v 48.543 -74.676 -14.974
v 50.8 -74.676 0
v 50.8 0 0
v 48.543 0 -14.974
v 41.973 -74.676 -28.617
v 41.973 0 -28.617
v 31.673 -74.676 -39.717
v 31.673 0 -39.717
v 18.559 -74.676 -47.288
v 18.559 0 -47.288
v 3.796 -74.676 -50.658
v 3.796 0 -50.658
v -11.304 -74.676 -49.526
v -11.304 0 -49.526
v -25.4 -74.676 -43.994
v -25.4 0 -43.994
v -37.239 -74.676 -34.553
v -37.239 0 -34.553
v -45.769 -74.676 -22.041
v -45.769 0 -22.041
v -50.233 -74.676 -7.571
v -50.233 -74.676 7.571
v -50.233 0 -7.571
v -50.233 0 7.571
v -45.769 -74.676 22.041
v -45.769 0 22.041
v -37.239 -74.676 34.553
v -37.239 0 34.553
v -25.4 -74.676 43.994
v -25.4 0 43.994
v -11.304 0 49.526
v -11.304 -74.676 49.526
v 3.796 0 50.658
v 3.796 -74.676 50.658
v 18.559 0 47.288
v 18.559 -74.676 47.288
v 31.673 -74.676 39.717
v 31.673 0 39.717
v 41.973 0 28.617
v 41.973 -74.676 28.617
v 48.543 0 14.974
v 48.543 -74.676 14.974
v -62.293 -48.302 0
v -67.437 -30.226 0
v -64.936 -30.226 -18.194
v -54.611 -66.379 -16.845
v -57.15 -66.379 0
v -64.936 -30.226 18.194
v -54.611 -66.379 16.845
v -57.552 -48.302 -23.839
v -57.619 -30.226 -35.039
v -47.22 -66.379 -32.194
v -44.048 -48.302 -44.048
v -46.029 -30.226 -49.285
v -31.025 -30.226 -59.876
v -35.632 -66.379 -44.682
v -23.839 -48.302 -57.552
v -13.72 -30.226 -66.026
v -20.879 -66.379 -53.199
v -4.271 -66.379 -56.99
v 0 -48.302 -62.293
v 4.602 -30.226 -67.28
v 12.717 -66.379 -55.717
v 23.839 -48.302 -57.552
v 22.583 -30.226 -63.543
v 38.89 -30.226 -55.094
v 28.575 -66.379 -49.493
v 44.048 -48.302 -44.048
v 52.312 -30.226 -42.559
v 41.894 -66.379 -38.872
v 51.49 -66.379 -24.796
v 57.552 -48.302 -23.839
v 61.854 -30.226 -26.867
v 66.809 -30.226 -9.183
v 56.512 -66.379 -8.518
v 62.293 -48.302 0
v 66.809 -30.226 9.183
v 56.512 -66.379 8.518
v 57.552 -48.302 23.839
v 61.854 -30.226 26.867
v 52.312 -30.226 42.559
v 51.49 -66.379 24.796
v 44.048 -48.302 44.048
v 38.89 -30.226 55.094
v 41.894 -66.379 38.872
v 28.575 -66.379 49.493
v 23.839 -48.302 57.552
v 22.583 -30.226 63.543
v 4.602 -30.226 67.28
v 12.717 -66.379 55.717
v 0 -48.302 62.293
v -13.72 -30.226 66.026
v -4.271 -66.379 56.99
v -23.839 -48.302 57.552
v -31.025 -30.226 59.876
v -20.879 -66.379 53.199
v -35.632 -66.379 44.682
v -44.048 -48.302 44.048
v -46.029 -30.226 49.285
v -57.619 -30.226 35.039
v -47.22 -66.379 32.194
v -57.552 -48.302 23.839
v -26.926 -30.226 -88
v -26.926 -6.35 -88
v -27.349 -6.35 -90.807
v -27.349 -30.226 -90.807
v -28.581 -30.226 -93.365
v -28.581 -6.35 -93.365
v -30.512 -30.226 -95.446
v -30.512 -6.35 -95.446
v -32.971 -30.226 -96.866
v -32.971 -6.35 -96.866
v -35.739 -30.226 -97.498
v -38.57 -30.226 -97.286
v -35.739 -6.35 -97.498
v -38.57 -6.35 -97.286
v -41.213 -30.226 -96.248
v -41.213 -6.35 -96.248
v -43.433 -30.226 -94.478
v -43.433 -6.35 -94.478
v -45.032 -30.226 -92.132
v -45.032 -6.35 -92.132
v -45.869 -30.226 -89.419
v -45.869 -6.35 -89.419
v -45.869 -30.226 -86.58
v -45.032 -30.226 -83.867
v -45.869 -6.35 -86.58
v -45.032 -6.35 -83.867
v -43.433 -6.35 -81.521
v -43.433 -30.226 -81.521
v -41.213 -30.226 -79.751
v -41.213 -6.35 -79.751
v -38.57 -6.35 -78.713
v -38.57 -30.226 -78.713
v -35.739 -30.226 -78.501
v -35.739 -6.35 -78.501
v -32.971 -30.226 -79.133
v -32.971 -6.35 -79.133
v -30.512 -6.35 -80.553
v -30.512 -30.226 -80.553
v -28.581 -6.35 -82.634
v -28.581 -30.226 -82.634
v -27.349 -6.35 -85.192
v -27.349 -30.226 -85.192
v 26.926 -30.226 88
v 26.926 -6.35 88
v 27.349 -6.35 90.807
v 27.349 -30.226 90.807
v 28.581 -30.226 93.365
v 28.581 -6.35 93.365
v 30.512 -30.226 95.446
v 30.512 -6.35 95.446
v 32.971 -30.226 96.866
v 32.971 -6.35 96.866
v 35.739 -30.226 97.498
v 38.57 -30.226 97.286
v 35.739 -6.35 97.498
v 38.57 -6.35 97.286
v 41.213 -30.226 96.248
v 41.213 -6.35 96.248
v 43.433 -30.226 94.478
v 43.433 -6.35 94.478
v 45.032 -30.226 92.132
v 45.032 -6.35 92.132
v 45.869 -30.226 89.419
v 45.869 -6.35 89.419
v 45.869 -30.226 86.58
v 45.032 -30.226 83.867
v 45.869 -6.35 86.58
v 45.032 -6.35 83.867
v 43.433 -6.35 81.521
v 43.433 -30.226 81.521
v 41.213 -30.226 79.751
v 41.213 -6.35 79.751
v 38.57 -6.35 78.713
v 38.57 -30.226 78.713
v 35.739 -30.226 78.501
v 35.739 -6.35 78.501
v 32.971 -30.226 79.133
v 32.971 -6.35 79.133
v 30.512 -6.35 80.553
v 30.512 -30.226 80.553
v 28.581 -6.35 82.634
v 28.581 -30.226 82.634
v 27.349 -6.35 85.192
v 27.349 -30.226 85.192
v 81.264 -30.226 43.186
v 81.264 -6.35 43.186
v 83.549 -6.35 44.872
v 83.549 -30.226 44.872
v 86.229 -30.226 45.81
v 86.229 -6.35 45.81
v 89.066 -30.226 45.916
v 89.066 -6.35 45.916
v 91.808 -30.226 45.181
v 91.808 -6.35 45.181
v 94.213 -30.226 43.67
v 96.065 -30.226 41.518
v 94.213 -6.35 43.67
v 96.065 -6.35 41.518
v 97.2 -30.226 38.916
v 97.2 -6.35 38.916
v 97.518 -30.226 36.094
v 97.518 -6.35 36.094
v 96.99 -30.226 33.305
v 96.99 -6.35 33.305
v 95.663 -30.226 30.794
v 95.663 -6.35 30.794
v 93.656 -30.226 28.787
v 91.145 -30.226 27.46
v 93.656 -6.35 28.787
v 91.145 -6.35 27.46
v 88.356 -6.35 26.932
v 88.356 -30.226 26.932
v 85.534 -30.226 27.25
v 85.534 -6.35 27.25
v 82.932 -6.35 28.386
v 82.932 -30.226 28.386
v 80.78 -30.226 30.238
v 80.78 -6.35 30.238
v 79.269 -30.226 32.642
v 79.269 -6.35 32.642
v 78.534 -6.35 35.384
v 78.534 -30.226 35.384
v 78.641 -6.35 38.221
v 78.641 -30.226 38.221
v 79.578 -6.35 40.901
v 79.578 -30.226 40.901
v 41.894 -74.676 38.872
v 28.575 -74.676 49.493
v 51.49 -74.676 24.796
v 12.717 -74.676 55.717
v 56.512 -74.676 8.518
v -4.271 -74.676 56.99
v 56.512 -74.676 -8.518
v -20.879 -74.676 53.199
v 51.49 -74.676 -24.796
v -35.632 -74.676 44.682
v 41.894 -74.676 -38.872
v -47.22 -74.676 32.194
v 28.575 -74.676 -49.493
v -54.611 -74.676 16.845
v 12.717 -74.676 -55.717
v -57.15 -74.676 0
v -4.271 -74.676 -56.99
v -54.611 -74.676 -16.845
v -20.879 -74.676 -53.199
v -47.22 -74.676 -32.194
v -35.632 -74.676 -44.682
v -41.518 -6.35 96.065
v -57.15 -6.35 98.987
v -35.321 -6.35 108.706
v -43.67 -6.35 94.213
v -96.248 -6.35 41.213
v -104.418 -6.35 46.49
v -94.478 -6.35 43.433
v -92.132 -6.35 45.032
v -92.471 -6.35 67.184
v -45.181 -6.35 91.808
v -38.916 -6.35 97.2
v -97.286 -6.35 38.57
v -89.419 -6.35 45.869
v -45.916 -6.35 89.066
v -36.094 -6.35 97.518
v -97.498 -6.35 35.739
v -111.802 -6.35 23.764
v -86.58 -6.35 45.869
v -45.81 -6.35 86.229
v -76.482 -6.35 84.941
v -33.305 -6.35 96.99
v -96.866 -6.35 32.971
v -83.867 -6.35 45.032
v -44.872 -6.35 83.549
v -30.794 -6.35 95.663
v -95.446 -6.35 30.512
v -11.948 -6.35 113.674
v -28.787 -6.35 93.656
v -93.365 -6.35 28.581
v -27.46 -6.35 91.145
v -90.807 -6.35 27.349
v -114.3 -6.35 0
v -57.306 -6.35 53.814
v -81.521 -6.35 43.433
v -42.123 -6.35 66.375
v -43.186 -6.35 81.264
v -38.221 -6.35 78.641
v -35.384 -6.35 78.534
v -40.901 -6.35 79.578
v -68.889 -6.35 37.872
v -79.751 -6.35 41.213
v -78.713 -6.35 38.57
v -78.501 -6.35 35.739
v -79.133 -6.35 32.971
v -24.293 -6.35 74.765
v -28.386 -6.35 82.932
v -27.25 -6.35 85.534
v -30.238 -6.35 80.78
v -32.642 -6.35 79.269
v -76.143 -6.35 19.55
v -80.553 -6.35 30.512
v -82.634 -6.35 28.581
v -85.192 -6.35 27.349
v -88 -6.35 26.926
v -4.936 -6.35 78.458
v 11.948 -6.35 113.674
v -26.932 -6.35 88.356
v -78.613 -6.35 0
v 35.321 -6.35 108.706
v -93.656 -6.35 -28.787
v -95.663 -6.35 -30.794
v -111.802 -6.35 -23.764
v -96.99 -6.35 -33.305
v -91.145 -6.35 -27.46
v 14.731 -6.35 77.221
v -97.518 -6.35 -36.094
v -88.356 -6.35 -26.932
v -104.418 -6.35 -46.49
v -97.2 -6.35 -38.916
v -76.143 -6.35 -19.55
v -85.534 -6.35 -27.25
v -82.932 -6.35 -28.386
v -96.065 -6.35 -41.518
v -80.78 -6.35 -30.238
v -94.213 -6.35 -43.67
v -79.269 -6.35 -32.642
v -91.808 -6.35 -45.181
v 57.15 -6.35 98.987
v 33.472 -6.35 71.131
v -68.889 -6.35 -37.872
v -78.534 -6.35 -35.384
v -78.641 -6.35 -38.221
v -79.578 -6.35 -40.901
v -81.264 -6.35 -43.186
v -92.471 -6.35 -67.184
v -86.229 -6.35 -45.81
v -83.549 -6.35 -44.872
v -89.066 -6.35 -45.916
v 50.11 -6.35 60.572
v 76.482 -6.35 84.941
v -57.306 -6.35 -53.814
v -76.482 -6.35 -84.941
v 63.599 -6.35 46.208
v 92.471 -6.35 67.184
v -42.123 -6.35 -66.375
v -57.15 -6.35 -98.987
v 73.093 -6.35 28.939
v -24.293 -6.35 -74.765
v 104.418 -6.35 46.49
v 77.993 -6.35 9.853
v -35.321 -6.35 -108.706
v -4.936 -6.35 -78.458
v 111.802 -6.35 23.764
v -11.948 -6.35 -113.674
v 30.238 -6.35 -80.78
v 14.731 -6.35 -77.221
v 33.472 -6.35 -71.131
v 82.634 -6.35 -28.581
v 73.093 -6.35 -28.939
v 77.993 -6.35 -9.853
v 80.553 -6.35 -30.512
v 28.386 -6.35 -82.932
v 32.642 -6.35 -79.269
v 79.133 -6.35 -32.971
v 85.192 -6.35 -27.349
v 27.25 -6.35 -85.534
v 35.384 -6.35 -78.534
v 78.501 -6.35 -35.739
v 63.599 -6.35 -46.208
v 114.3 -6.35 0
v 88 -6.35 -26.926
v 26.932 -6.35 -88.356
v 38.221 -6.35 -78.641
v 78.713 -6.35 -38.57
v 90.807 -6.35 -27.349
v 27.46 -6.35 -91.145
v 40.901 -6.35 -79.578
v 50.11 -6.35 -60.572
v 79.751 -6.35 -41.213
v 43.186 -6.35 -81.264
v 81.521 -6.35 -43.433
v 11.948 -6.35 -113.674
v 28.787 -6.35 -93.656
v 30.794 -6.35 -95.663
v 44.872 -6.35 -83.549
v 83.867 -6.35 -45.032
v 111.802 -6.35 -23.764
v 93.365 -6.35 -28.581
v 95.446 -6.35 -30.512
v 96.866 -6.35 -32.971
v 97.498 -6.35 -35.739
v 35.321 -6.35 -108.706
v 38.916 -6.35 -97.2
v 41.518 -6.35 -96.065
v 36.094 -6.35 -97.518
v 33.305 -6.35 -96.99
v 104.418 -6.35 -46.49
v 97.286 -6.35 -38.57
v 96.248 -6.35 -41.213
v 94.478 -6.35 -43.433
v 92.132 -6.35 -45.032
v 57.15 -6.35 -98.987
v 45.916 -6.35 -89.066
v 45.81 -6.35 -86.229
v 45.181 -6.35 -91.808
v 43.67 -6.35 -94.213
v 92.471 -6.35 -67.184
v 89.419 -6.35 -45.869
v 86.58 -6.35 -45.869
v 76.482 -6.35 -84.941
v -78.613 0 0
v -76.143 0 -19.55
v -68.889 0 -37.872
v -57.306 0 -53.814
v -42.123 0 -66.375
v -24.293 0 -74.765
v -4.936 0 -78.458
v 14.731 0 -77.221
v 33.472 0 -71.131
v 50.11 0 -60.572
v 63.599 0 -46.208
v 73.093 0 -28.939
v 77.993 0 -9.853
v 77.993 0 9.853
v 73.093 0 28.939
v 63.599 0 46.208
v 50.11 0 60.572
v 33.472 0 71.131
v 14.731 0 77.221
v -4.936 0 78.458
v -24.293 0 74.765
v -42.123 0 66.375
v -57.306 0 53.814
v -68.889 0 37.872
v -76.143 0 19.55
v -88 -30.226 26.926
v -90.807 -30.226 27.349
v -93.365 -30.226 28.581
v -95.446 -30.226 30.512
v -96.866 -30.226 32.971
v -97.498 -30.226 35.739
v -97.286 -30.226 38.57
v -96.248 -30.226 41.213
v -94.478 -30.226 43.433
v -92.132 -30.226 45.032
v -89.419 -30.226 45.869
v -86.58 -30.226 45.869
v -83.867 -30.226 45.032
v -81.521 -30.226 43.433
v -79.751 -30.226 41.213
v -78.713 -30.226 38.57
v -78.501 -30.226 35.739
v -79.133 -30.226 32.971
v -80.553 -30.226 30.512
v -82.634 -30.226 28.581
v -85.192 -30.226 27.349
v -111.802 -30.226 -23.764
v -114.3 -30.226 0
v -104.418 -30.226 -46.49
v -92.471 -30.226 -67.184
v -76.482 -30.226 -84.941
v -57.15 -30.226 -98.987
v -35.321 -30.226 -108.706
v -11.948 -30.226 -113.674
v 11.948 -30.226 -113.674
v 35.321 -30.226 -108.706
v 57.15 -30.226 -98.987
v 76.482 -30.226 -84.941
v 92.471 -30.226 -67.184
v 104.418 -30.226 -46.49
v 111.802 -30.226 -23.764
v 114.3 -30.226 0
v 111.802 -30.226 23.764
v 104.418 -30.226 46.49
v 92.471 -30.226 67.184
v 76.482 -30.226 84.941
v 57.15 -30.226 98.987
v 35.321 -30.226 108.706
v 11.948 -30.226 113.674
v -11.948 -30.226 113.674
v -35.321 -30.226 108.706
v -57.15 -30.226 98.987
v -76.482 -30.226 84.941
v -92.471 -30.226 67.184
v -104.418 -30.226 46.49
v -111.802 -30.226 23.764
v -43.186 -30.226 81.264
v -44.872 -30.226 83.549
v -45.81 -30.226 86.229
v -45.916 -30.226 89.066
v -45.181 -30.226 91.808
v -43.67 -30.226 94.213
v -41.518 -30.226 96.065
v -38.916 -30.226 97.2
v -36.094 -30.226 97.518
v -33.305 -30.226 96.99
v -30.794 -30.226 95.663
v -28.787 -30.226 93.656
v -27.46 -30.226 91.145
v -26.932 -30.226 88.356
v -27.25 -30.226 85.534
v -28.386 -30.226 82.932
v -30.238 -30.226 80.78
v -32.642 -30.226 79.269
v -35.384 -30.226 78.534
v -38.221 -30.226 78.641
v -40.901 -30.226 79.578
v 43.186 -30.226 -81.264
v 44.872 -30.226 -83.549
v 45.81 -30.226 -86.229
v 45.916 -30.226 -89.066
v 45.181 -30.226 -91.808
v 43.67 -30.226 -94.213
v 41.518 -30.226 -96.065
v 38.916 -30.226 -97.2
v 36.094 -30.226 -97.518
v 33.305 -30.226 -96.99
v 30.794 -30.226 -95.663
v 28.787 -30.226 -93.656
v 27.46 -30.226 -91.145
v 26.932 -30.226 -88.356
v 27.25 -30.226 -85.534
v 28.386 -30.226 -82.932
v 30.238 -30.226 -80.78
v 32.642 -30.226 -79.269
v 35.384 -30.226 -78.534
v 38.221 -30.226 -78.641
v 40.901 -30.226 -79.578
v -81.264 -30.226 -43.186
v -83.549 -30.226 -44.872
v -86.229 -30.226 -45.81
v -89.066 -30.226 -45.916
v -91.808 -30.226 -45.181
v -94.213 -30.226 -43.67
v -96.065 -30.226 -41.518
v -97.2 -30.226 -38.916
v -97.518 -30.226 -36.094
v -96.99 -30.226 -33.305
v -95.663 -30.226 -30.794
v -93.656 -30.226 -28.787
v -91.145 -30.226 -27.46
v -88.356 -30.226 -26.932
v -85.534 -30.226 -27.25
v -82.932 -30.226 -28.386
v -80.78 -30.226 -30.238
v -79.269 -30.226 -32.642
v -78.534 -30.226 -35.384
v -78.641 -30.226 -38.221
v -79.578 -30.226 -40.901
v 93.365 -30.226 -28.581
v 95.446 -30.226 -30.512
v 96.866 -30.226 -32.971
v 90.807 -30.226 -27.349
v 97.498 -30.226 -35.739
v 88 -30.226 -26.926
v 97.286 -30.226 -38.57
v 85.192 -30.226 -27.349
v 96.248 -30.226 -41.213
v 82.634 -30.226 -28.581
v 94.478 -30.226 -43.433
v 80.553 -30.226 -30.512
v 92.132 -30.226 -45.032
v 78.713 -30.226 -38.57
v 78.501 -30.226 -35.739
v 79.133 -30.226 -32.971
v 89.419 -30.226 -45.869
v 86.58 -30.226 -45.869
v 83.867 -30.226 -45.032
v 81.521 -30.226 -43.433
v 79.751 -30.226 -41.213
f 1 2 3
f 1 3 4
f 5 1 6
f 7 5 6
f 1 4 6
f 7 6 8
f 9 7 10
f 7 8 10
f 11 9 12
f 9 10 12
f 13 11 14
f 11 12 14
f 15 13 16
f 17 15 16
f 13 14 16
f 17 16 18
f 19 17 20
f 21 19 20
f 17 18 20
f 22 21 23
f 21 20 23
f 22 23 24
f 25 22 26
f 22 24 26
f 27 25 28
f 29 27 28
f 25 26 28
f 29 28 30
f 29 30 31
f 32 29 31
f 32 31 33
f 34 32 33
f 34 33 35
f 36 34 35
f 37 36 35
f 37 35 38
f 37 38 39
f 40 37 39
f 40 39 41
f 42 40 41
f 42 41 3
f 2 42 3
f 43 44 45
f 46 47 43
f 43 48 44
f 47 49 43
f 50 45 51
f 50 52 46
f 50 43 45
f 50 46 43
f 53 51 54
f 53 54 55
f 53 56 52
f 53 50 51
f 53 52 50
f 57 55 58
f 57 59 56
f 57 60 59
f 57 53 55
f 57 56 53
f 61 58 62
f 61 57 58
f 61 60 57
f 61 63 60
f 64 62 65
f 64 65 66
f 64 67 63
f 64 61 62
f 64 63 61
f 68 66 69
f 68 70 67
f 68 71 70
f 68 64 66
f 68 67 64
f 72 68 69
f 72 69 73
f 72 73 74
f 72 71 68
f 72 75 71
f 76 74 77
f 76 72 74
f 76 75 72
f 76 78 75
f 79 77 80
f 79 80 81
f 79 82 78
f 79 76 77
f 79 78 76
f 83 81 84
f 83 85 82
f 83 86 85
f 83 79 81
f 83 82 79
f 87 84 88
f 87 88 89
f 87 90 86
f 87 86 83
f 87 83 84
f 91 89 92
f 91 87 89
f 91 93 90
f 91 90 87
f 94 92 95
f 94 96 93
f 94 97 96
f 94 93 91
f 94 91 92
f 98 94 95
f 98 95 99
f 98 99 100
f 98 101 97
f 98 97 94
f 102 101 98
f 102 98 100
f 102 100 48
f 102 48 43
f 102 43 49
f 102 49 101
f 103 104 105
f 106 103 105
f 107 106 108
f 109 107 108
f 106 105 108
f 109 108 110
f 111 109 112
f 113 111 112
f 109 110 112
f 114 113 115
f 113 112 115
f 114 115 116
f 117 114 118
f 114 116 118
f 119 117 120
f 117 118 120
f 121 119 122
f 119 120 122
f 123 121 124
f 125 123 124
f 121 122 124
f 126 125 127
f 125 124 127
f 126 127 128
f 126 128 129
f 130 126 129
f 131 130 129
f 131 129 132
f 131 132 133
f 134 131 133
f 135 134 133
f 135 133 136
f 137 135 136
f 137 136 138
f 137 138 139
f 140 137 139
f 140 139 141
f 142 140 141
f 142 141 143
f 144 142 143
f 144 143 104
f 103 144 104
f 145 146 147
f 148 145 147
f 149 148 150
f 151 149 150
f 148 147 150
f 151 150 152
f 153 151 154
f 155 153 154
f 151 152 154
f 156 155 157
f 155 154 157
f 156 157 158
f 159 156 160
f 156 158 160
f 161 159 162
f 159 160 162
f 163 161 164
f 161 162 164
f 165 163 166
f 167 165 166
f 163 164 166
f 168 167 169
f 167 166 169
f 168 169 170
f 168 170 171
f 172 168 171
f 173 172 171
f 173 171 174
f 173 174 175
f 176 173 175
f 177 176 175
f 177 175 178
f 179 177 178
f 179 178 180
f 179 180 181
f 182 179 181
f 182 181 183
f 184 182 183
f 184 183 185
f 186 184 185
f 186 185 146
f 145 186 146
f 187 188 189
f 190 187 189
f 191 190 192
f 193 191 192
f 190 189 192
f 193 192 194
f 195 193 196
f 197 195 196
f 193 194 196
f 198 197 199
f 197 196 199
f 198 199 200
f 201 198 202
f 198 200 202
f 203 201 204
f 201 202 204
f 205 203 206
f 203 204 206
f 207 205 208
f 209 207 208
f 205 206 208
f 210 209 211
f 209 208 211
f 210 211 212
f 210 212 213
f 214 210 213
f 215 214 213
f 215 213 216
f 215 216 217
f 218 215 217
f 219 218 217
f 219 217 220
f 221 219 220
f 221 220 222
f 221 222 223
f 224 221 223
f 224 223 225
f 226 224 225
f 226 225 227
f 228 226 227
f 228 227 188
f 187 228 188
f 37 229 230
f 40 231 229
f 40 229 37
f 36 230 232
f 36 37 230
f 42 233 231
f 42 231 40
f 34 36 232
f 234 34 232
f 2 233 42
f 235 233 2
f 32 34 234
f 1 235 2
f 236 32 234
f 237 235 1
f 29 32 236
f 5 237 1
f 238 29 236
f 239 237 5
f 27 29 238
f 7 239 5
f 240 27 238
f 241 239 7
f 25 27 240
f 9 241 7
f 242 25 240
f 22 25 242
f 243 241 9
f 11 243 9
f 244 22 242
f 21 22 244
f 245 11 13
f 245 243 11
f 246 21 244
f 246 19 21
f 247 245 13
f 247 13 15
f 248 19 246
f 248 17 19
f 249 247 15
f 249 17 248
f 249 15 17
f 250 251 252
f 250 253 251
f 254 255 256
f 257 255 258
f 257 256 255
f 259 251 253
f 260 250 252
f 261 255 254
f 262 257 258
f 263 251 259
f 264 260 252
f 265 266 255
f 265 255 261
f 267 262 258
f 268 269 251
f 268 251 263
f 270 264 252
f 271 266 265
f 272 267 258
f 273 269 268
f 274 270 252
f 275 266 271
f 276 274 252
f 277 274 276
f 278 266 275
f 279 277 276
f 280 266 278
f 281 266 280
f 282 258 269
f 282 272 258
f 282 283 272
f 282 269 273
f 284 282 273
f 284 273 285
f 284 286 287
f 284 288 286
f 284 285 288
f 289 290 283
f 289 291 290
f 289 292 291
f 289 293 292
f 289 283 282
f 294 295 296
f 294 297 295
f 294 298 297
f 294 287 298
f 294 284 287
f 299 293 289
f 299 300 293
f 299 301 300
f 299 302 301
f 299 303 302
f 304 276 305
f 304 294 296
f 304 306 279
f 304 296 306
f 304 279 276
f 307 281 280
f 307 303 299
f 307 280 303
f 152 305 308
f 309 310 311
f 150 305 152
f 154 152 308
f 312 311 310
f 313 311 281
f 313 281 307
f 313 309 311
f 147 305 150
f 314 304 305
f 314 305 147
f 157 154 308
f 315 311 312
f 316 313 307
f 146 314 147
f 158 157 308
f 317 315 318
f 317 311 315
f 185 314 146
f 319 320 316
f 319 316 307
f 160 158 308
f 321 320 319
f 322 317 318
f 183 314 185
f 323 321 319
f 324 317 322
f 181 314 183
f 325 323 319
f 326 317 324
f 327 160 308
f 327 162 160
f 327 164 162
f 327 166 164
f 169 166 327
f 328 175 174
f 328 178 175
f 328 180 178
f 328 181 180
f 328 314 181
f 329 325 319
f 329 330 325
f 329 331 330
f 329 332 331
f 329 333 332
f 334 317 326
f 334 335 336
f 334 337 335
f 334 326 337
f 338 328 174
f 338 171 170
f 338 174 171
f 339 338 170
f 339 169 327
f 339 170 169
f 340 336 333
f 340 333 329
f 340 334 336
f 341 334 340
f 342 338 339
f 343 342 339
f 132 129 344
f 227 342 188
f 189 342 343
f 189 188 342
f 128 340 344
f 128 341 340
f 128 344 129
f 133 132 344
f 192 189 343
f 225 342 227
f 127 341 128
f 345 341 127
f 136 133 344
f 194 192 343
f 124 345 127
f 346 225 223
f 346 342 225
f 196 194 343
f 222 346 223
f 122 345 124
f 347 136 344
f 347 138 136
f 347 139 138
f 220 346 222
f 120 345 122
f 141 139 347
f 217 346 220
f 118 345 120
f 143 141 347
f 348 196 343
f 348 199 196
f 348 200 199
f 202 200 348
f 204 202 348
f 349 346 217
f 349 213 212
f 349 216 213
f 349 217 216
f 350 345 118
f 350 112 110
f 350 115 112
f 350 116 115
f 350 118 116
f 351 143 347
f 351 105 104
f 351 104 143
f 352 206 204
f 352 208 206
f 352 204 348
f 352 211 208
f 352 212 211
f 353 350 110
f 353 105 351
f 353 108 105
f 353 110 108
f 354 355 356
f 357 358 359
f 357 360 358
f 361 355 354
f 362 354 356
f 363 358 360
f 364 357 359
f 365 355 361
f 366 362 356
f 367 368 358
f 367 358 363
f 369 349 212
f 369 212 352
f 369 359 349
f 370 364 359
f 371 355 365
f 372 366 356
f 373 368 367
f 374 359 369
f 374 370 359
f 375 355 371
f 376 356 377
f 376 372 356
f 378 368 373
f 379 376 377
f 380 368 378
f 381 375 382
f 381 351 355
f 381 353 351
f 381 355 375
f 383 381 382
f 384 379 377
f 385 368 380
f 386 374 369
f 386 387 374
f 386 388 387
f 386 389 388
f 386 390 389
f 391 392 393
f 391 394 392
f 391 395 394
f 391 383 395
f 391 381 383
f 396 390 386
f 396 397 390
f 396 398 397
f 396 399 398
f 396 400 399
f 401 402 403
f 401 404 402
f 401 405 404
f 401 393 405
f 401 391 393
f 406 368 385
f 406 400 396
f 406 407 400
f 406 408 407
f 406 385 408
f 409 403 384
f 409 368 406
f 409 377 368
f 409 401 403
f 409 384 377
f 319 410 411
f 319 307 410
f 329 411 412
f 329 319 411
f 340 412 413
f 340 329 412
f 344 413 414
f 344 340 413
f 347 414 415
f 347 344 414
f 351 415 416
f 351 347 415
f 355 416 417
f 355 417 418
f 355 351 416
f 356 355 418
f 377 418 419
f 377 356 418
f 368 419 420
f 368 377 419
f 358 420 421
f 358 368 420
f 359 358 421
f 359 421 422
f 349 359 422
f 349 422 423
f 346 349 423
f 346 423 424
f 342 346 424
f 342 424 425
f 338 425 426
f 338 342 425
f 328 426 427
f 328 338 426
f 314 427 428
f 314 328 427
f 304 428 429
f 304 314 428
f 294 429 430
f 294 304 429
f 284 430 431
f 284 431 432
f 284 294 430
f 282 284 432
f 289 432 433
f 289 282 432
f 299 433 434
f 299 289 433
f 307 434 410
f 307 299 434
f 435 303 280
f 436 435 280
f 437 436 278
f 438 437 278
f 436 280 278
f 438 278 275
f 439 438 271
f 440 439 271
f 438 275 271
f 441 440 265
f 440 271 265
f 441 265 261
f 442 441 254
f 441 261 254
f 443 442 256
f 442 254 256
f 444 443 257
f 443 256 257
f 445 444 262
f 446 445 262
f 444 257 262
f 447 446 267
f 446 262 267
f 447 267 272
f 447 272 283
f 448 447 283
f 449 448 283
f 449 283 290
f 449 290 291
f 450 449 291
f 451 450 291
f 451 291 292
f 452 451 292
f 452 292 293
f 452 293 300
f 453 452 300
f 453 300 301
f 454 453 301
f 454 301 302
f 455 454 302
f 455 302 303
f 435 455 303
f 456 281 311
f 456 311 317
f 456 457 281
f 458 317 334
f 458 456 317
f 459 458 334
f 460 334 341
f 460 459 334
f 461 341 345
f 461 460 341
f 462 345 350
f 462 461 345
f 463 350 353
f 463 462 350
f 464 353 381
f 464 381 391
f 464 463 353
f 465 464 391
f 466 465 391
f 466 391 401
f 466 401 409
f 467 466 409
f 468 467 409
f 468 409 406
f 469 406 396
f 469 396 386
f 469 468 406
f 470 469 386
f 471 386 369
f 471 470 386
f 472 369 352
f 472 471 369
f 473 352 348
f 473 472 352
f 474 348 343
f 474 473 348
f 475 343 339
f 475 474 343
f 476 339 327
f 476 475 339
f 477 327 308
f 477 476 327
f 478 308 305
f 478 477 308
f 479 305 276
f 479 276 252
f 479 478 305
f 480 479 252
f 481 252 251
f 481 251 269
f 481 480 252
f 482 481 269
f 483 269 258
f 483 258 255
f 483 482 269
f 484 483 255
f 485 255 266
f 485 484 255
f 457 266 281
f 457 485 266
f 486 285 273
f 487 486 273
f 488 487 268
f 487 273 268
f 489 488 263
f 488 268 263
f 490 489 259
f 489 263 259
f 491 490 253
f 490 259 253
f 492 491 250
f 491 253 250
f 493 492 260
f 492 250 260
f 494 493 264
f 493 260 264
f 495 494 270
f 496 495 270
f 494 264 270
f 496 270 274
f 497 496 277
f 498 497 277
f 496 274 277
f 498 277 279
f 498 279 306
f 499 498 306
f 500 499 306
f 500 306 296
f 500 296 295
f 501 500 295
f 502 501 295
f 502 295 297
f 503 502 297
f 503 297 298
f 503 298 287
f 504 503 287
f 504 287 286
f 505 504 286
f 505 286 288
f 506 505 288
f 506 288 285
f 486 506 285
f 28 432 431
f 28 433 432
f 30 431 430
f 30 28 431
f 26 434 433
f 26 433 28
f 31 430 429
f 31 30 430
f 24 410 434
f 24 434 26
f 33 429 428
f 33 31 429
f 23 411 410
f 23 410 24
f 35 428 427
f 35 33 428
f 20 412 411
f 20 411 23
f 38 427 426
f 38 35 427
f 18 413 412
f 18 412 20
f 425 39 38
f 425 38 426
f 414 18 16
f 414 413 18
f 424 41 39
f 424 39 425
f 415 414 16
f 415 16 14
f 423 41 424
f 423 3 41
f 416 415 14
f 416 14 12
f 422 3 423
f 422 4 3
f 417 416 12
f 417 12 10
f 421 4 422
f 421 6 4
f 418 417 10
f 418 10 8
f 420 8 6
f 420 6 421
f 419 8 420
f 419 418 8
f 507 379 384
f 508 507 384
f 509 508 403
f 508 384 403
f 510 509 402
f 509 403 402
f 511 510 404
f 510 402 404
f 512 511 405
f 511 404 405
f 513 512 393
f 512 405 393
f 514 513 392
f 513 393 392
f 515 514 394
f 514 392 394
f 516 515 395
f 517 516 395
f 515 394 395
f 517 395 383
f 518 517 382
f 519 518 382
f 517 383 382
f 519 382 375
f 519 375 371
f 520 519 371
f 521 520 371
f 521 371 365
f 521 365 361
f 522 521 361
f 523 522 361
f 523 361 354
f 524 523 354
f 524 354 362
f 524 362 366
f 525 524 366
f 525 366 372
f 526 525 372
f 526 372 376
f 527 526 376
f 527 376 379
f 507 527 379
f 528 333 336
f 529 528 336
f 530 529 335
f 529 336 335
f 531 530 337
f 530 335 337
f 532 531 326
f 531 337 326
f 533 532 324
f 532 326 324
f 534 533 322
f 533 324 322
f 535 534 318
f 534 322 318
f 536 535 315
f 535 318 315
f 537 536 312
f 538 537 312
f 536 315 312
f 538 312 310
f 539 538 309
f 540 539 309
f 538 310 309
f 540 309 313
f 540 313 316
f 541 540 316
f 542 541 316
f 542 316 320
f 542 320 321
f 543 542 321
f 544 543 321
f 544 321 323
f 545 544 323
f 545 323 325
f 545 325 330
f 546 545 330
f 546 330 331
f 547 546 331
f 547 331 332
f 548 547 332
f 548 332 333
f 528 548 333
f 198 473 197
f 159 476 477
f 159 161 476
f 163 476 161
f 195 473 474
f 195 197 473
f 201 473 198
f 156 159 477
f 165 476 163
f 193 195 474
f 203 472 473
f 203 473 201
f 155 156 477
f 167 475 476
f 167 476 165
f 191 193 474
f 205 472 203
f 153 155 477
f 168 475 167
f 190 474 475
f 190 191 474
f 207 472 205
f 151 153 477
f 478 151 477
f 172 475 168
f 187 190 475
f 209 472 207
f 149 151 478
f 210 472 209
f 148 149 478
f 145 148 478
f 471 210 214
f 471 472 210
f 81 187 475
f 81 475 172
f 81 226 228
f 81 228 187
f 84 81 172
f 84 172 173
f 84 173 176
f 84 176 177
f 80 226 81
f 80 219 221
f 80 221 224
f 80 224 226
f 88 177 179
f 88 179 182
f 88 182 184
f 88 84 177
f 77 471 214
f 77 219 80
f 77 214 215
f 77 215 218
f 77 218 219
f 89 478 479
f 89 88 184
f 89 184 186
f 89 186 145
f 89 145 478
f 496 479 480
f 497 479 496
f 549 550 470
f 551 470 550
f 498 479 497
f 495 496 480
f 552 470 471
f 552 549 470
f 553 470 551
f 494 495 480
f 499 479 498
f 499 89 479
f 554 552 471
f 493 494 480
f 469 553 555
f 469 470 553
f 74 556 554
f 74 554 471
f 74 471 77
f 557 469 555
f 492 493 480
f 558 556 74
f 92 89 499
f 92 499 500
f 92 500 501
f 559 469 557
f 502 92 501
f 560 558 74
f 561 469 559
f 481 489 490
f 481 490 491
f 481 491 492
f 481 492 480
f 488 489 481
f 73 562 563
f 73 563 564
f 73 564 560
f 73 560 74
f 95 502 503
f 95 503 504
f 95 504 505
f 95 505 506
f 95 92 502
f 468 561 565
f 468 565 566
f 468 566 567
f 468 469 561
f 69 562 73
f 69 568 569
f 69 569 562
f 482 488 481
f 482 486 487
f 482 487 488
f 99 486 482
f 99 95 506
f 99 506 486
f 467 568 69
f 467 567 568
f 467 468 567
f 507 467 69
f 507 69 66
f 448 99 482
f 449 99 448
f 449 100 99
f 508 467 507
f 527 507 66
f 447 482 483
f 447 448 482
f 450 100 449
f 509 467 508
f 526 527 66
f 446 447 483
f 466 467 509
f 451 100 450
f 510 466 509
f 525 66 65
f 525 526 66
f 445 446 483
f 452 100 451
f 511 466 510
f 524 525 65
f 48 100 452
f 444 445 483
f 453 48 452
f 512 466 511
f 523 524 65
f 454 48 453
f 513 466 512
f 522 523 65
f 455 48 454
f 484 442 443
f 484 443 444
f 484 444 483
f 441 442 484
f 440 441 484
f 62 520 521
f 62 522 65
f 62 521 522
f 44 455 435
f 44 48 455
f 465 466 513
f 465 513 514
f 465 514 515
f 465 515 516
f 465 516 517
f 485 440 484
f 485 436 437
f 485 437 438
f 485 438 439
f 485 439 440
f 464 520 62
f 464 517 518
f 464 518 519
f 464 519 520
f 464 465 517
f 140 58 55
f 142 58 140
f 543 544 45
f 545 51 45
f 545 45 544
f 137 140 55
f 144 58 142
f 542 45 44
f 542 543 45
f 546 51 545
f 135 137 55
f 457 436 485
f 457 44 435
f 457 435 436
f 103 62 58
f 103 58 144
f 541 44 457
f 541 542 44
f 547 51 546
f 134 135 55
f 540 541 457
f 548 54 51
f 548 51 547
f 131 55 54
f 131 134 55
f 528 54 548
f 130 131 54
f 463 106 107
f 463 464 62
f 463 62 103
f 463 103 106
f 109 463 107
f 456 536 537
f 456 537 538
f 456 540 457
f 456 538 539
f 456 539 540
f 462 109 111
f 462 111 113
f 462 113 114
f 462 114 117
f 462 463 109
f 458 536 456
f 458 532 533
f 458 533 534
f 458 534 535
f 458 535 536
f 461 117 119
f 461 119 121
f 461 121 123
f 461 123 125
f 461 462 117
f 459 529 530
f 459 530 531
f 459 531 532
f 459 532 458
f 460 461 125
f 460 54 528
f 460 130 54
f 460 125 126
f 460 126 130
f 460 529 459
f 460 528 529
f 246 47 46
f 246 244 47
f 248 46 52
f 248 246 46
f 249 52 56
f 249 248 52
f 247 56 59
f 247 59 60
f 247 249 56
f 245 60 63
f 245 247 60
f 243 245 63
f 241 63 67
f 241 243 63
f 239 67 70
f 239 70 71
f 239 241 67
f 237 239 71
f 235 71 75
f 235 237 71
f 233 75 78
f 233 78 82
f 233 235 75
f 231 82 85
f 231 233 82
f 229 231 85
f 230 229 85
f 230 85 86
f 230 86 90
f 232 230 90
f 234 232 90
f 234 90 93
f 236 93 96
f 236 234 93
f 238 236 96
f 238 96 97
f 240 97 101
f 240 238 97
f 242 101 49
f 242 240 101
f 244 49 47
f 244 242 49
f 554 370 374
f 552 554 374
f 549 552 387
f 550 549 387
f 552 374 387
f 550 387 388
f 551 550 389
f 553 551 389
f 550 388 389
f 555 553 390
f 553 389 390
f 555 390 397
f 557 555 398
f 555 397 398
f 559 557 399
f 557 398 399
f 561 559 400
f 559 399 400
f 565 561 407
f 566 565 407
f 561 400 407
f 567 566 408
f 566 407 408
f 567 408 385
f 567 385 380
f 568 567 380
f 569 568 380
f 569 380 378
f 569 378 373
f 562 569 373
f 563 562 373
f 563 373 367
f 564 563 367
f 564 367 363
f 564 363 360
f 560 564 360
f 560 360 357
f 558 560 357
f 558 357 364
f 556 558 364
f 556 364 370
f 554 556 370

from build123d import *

# Parameters (mm, degrees)
BORESKETCH_R       = 50.8
BORE_DEPTH         = 75.676
SKETCH3_R          = 9.525
BOLT_HOLE_DEPTH    = 69.326
BOLT_PATTERN_COUNT = 8


with BuildPart() as part:
    # Main → Revolve1 (revolve)
    with BuildSketch(Plane.XY):
        Polygon((0, 0), (-78.613, 0), (-78.613, -6.35), (-114.3, -6.35), (-114.3, -30.226), (-67.437, -30.226), (-57.15, -66.378666667), (-57.15, -74.676), (0, -74.676), align=None)
    revolve(axis=Axis((0, 0, 0), (0, -1, 0)))

    # BoreSketch → Bore (cut, through all)
    with BuildSketch(Plane(origin=(0, 0, 0), x_dir=(1, 0, 0), z_dir=(0, 1, 0))):
        Circle(BORESKETCH_R)
    extrude(amount=-BORE_DEPTH, mode=Mode.SUBTRACT)

    # Sketch3 → Bolt Hole (cut, through all)
    with BuildSketch(Plane(origin=(0, -6.35, 0), x_dir=(1, 0, 0), z_dir=(0, 1, 0))):
        with Locations((-36.450596933, 87.999525472)):
            Circle(SKETCH3_R)
    bolt_hole = extrude(amount=-BOLT_HOLE_DEPTH, mode=Mode.SUBTRACT)

    # Bolt Pattern: Bolt Hole ×8 about axis
    bolt_pattern_axis = Axis((0, 0, 0), (0, 1, 0))
    for i in range(1, BOLT_PATTERN_COUNT):
        add(bolt_hole.rotate(bolt_pattern_axis, i * 360 / BOLT_PATTERN_COUNT), mode=Mode.SUBTRACT)


solid = part.part
